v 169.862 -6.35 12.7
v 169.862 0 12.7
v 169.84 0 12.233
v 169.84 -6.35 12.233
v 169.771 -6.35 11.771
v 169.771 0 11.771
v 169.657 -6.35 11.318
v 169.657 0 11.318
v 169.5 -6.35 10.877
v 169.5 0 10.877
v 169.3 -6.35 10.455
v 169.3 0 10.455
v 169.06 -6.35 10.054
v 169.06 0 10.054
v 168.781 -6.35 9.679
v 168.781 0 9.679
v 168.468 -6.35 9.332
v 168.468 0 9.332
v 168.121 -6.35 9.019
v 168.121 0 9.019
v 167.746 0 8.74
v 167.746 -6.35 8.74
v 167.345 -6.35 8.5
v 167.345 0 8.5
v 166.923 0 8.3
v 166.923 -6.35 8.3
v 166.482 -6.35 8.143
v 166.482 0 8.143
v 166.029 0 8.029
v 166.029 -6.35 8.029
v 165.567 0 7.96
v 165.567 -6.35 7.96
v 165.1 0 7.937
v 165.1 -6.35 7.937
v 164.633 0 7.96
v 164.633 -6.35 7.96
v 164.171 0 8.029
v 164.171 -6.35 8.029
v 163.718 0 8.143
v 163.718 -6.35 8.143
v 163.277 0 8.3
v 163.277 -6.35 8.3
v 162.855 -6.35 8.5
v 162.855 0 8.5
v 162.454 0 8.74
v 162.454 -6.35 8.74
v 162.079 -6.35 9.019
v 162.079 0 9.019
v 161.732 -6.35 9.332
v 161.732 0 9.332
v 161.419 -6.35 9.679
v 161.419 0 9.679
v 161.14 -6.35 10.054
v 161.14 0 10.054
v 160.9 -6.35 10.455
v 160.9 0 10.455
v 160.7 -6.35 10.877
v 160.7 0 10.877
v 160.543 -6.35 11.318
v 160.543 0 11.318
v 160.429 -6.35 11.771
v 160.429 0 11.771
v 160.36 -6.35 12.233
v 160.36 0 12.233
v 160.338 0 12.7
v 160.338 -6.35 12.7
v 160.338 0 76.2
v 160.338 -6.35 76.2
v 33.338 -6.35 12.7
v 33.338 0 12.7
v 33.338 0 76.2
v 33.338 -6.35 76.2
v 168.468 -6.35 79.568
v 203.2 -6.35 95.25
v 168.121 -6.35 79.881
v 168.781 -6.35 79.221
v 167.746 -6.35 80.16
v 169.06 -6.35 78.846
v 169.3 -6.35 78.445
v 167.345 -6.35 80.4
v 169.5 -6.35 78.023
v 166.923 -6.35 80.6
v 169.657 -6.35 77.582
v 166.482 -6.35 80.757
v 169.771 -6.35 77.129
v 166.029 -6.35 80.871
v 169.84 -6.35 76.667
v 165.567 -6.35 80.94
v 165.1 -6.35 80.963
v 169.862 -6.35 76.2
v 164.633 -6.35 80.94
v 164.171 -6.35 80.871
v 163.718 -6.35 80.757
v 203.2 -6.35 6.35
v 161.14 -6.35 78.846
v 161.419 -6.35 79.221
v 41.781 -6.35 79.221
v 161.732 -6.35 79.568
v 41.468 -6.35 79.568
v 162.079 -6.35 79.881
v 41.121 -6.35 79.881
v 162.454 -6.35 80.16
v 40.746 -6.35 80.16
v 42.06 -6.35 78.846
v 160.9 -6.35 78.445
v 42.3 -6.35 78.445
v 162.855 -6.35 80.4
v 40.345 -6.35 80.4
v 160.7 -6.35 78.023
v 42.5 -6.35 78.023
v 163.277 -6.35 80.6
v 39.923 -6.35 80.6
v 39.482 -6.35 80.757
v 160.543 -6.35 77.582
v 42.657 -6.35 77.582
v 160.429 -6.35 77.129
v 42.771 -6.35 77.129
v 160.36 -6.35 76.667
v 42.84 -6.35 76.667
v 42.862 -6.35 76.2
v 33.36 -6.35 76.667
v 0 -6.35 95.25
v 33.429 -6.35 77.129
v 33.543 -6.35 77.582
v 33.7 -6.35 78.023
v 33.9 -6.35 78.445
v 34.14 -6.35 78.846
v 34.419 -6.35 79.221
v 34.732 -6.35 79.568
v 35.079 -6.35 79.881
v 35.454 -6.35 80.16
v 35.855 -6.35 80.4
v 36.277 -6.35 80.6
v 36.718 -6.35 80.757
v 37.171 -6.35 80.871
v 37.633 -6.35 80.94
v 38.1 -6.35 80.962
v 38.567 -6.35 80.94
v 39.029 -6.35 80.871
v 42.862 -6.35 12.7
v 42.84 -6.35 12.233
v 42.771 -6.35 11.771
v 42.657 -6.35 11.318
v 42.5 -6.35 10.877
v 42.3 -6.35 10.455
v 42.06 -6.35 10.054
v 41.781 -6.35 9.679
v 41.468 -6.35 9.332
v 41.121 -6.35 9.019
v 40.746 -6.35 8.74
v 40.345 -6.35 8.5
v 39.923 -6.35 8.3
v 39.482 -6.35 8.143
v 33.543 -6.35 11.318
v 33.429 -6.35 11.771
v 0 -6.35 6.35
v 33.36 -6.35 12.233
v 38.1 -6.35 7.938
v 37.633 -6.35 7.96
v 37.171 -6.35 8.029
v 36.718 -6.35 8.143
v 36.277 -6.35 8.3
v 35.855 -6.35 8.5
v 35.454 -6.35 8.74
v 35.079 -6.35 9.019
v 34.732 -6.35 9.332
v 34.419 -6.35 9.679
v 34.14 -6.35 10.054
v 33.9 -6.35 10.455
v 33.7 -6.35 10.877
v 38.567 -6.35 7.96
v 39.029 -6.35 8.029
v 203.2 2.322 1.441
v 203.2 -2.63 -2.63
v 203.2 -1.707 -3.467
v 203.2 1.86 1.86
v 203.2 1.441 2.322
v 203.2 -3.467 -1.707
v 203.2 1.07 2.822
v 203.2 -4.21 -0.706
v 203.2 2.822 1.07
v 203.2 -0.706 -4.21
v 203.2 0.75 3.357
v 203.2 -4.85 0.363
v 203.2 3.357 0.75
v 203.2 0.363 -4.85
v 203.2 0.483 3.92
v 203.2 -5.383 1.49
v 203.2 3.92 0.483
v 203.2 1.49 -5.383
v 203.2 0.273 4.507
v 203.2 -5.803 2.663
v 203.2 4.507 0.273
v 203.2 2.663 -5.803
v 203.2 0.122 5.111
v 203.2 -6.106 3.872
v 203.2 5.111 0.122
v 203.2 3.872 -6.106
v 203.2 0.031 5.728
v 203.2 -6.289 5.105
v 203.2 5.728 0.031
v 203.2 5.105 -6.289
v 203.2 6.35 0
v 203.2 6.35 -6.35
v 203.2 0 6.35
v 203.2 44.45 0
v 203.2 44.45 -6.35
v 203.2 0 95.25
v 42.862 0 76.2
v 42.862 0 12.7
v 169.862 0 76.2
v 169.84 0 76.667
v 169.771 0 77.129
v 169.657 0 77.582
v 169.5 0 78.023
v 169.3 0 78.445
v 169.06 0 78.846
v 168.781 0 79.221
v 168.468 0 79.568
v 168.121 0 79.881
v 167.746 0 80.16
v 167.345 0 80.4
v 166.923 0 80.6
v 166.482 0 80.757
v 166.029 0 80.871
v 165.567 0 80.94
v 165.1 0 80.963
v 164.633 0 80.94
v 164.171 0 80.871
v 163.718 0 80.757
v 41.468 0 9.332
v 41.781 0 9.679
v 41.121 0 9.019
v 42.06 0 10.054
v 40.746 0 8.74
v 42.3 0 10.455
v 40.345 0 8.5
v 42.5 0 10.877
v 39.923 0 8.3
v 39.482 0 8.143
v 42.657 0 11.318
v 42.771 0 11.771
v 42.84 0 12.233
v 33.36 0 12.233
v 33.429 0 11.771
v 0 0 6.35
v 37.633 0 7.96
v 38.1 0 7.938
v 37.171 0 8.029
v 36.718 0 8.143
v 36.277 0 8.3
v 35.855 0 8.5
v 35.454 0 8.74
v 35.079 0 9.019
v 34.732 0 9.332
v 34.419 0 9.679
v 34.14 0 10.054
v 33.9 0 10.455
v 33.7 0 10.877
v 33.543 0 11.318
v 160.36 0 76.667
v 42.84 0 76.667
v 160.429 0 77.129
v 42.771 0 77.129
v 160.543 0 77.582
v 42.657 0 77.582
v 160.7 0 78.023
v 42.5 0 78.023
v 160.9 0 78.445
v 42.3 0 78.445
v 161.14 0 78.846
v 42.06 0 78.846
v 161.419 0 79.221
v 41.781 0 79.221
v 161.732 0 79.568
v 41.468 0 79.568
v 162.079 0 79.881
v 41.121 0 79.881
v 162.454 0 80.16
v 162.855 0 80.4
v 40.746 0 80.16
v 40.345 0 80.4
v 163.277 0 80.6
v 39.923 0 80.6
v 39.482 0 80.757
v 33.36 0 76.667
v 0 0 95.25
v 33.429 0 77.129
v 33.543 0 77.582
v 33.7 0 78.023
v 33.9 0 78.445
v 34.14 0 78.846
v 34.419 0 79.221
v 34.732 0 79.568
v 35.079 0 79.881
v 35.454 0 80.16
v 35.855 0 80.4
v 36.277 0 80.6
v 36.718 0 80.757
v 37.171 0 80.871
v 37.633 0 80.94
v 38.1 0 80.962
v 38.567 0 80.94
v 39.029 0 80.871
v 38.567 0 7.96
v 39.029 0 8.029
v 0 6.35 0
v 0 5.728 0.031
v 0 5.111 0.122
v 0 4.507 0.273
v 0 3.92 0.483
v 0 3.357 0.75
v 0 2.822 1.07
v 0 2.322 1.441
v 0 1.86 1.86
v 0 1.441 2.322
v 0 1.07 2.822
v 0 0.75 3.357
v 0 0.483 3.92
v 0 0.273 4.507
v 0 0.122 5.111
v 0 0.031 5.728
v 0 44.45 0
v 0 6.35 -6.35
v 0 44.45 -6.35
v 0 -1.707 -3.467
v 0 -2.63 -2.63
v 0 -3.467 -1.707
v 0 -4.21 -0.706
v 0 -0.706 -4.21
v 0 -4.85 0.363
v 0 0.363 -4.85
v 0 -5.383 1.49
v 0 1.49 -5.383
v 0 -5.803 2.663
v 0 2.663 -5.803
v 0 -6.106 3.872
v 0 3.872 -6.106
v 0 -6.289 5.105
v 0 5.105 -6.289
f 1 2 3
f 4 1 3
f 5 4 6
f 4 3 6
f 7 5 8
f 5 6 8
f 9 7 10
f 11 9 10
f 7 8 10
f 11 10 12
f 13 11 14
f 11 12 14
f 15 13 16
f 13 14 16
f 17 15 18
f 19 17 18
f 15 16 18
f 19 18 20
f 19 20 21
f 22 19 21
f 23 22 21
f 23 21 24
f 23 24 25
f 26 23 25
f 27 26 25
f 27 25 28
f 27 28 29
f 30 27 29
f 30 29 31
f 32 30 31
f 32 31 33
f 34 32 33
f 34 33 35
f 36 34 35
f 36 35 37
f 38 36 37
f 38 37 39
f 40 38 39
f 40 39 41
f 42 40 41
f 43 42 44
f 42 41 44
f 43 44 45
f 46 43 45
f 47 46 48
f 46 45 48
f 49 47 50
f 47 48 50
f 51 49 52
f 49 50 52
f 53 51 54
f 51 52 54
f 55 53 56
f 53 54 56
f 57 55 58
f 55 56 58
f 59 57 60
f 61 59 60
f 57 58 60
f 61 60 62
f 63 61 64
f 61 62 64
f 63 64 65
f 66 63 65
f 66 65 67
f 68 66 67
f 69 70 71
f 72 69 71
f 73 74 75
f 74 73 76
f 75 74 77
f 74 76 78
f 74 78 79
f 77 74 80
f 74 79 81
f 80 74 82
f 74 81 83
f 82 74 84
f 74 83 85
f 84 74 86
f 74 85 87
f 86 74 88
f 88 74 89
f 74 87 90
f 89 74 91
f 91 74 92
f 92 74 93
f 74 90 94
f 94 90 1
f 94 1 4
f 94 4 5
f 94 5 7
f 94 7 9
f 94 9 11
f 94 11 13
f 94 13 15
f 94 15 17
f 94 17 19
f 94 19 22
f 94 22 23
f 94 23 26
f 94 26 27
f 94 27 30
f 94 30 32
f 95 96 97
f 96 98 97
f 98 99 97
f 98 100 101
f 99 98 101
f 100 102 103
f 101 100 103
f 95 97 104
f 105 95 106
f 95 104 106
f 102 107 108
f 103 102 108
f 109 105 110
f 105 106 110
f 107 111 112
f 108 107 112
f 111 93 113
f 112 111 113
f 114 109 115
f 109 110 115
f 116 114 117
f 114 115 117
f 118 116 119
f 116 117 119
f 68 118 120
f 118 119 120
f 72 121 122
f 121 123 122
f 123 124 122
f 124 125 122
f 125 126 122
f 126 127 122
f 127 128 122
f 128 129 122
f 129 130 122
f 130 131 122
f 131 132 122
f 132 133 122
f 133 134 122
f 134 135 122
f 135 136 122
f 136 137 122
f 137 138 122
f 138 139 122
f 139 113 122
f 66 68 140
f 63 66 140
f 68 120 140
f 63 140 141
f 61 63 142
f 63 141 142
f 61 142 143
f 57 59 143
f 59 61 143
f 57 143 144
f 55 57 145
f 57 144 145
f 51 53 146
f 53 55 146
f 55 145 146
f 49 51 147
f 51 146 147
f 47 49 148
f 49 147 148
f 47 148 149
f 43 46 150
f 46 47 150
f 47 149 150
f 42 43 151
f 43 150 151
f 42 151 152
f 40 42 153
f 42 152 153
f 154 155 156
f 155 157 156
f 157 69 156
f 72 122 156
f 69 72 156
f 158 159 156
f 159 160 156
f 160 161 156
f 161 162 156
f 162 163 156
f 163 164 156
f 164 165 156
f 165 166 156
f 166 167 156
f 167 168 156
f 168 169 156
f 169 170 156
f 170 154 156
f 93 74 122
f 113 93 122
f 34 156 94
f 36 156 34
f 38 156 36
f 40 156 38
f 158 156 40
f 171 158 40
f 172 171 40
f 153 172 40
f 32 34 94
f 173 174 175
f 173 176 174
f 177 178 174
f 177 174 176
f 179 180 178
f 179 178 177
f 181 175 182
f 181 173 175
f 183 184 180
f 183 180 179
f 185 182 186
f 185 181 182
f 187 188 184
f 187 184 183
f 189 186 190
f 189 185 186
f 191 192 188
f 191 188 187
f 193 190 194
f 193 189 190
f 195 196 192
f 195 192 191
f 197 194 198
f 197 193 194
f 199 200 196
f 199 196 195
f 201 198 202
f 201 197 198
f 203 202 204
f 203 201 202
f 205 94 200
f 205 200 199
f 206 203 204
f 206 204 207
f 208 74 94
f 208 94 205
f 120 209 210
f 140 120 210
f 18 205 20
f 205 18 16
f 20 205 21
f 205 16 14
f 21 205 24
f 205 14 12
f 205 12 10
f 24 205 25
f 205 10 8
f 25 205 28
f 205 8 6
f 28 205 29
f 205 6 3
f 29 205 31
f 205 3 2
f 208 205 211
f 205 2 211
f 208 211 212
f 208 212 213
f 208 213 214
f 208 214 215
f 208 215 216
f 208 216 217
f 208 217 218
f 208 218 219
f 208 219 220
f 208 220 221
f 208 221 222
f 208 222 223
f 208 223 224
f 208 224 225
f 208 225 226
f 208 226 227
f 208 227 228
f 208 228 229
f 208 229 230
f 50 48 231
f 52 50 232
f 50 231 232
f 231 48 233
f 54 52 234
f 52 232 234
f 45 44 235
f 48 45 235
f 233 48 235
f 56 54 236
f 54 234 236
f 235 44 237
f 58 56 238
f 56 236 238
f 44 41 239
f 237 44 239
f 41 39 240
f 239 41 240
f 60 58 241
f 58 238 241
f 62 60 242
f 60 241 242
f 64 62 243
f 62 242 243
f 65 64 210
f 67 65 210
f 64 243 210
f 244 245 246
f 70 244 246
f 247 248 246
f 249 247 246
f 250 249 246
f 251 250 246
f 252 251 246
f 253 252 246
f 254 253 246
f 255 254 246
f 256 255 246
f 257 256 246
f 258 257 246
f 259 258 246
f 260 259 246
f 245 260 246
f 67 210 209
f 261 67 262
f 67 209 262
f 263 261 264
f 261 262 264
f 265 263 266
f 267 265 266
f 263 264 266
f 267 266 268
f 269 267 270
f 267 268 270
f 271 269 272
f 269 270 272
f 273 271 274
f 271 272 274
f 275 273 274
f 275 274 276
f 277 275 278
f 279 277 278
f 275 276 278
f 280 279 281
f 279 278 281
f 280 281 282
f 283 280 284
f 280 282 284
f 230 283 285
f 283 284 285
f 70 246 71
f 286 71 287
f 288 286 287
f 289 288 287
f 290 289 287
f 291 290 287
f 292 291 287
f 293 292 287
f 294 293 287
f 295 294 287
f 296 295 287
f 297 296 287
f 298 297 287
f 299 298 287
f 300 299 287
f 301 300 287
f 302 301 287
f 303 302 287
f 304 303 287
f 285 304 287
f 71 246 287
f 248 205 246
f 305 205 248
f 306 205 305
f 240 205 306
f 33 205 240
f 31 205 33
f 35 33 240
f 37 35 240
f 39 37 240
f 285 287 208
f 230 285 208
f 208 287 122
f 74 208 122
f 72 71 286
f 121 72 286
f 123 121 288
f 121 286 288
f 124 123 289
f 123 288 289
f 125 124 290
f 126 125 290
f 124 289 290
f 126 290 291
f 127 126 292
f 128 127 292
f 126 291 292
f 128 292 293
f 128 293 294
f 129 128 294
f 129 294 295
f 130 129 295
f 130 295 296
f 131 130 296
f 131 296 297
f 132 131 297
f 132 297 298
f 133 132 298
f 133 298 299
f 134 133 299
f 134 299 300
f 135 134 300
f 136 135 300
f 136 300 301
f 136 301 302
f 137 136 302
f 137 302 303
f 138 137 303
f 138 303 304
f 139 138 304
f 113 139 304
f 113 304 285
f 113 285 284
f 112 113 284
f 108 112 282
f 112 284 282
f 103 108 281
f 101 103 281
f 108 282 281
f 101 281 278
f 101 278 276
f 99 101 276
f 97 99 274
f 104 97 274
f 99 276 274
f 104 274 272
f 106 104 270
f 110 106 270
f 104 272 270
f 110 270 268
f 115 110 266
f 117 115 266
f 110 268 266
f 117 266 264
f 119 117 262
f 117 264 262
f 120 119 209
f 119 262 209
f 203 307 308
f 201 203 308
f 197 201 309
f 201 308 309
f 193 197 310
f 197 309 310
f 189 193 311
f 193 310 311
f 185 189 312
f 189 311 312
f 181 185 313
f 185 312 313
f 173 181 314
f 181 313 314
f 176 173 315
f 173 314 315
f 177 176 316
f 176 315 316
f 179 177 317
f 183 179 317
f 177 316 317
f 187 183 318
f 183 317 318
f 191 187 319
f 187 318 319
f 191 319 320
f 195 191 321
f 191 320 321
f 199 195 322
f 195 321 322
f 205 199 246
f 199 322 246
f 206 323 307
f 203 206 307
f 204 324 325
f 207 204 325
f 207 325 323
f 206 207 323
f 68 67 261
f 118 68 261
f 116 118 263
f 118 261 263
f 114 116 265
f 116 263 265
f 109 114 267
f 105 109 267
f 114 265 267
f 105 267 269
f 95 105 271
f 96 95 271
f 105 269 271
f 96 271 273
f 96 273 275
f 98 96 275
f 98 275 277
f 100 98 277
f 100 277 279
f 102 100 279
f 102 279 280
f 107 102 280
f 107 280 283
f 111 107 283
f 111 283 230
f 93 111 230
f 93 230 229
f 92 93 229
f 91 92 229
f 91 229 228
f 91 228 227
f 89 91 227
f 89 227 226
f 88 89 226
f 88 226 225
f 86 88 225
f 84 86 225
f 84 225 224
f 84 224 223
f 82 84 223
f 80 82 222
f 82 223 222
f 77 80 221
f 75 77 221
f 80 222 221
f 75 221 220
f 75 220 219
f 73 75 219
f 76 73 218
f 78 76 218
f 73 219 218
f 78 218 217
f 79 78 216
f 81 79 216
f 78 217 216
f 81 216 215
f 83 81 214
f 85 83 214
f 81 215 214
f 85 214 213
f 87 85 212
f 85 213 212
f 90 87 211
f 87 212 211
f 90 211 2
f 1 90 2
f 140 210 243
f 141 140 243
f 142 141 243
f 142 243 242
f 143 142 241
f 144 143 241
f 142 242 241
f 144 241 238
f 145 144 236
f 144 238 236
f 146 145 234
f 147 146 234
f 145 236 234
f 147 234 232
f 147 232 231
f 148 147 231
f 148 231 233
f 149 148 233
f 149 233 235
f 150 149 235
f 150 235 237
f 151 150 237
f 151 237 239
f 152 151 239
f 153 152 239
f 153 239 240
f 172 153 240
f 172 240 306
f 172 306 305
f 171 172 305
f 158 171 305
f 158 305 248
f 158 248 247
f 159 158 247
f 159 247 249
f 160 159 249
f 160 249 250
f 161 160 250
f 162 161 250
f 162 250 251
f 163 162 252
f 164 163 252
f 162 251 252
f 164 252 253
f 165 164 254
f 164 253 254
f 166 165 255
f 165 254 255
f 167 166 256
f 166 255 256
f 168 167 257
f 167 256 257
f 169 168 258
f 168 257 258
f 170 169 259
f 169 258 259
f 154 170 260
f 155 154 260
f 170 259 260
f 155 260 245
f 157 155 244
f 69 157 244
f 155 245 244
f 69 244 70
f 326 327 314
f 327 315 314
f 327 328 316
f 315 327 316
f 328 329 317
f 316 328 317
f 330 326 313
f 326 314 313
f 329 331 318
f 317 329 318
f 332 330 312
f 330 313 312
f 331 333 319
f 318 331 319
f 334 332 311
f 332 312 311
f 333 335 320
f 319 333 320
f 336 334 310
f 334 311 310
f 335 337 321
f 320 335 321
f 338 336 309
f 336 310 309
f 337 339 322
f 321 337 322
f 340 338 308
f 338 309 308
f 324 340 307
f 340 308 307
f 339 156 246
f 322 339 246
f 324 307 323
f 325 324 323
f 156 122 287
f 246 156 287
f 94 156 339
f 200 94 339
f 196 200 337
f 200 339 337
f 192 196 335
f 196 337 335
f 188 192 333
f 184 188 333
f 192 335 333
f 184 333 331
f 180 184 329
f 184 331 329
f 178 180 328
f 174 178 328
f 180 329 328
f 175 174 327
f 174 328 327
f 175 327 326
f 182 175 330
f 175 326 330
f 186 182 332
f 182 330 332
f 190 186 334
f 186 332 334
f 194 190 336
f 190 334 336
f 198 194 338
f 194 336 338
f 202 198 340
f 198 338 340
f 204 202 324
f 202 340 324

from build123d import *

# Parameters (mm, degrees)
F1_DEPTH = 203.2
F3_DEPTH = 6.351


with BuildPart() as f1:
    # F0 (on Right) → F1 (new body)
    with BuildSketch(Plane.YZ):
        with BuildLine():
            Line((0, 95.25), (-6.35, 95.25))
            Line((-6.35, 95.25), (-6.35, 6.35))
            ThreePointArc((-6.35, 6.35), (-2.630256, -2.630256), (6.35, -6.35))
            Line((6.35, -6.35), (44.45, -6.35))
            Line((44.45, -6.35), (44.45, 0))
            Line((44.45, 0), (6.35, 0))
            ThreePointArc((6.35, 0), (1.859872, 1.859872), (0, 6.35))
            Line((0, 6.35), (0, 95.25))
        make_face()
    extrude(amount=F1_DEPTH)

    # F2 (on face) → F3 (cut, through all)
    with BuildSketch(Plane(origin=(0, 0, 0), x_dir=(-1, 0, 0), z_dir=(0, 1, 0))):
        with BuildLine():
            Line((-160.3375, 12.7), (-160.3375, 76.2))
            ThreePointArc((-160.3375, 76.2), (-165.1, 80.9625), (-169.8625, 76.2))
            Line((-169.8625, 76.2), (-169.8625, 12.7))
            ThreePointArc((-169.8625, 12.7), (-165.1, 7.9375), (-160.3375, 12.7))
        make_face()
        with BuildLine():
            Line((-33.3375, 12.7), (-33.3375, 76.2))
            ThreePointArc((-33.3375, 76.2), (-38.1, 80.9625), (-42.8625, 76.2))
            Line((-42.8625, 76.2), (-42.8625, 12.7))
            ThreePointArc((-42.8625, 12.7), (-38.1, 7.9375), (-33.3375, 12.7))
        make_face()
    extrude(amount=-F3_DEPTH, mode=Mode.SUBTRACT)


solid = f1.part
